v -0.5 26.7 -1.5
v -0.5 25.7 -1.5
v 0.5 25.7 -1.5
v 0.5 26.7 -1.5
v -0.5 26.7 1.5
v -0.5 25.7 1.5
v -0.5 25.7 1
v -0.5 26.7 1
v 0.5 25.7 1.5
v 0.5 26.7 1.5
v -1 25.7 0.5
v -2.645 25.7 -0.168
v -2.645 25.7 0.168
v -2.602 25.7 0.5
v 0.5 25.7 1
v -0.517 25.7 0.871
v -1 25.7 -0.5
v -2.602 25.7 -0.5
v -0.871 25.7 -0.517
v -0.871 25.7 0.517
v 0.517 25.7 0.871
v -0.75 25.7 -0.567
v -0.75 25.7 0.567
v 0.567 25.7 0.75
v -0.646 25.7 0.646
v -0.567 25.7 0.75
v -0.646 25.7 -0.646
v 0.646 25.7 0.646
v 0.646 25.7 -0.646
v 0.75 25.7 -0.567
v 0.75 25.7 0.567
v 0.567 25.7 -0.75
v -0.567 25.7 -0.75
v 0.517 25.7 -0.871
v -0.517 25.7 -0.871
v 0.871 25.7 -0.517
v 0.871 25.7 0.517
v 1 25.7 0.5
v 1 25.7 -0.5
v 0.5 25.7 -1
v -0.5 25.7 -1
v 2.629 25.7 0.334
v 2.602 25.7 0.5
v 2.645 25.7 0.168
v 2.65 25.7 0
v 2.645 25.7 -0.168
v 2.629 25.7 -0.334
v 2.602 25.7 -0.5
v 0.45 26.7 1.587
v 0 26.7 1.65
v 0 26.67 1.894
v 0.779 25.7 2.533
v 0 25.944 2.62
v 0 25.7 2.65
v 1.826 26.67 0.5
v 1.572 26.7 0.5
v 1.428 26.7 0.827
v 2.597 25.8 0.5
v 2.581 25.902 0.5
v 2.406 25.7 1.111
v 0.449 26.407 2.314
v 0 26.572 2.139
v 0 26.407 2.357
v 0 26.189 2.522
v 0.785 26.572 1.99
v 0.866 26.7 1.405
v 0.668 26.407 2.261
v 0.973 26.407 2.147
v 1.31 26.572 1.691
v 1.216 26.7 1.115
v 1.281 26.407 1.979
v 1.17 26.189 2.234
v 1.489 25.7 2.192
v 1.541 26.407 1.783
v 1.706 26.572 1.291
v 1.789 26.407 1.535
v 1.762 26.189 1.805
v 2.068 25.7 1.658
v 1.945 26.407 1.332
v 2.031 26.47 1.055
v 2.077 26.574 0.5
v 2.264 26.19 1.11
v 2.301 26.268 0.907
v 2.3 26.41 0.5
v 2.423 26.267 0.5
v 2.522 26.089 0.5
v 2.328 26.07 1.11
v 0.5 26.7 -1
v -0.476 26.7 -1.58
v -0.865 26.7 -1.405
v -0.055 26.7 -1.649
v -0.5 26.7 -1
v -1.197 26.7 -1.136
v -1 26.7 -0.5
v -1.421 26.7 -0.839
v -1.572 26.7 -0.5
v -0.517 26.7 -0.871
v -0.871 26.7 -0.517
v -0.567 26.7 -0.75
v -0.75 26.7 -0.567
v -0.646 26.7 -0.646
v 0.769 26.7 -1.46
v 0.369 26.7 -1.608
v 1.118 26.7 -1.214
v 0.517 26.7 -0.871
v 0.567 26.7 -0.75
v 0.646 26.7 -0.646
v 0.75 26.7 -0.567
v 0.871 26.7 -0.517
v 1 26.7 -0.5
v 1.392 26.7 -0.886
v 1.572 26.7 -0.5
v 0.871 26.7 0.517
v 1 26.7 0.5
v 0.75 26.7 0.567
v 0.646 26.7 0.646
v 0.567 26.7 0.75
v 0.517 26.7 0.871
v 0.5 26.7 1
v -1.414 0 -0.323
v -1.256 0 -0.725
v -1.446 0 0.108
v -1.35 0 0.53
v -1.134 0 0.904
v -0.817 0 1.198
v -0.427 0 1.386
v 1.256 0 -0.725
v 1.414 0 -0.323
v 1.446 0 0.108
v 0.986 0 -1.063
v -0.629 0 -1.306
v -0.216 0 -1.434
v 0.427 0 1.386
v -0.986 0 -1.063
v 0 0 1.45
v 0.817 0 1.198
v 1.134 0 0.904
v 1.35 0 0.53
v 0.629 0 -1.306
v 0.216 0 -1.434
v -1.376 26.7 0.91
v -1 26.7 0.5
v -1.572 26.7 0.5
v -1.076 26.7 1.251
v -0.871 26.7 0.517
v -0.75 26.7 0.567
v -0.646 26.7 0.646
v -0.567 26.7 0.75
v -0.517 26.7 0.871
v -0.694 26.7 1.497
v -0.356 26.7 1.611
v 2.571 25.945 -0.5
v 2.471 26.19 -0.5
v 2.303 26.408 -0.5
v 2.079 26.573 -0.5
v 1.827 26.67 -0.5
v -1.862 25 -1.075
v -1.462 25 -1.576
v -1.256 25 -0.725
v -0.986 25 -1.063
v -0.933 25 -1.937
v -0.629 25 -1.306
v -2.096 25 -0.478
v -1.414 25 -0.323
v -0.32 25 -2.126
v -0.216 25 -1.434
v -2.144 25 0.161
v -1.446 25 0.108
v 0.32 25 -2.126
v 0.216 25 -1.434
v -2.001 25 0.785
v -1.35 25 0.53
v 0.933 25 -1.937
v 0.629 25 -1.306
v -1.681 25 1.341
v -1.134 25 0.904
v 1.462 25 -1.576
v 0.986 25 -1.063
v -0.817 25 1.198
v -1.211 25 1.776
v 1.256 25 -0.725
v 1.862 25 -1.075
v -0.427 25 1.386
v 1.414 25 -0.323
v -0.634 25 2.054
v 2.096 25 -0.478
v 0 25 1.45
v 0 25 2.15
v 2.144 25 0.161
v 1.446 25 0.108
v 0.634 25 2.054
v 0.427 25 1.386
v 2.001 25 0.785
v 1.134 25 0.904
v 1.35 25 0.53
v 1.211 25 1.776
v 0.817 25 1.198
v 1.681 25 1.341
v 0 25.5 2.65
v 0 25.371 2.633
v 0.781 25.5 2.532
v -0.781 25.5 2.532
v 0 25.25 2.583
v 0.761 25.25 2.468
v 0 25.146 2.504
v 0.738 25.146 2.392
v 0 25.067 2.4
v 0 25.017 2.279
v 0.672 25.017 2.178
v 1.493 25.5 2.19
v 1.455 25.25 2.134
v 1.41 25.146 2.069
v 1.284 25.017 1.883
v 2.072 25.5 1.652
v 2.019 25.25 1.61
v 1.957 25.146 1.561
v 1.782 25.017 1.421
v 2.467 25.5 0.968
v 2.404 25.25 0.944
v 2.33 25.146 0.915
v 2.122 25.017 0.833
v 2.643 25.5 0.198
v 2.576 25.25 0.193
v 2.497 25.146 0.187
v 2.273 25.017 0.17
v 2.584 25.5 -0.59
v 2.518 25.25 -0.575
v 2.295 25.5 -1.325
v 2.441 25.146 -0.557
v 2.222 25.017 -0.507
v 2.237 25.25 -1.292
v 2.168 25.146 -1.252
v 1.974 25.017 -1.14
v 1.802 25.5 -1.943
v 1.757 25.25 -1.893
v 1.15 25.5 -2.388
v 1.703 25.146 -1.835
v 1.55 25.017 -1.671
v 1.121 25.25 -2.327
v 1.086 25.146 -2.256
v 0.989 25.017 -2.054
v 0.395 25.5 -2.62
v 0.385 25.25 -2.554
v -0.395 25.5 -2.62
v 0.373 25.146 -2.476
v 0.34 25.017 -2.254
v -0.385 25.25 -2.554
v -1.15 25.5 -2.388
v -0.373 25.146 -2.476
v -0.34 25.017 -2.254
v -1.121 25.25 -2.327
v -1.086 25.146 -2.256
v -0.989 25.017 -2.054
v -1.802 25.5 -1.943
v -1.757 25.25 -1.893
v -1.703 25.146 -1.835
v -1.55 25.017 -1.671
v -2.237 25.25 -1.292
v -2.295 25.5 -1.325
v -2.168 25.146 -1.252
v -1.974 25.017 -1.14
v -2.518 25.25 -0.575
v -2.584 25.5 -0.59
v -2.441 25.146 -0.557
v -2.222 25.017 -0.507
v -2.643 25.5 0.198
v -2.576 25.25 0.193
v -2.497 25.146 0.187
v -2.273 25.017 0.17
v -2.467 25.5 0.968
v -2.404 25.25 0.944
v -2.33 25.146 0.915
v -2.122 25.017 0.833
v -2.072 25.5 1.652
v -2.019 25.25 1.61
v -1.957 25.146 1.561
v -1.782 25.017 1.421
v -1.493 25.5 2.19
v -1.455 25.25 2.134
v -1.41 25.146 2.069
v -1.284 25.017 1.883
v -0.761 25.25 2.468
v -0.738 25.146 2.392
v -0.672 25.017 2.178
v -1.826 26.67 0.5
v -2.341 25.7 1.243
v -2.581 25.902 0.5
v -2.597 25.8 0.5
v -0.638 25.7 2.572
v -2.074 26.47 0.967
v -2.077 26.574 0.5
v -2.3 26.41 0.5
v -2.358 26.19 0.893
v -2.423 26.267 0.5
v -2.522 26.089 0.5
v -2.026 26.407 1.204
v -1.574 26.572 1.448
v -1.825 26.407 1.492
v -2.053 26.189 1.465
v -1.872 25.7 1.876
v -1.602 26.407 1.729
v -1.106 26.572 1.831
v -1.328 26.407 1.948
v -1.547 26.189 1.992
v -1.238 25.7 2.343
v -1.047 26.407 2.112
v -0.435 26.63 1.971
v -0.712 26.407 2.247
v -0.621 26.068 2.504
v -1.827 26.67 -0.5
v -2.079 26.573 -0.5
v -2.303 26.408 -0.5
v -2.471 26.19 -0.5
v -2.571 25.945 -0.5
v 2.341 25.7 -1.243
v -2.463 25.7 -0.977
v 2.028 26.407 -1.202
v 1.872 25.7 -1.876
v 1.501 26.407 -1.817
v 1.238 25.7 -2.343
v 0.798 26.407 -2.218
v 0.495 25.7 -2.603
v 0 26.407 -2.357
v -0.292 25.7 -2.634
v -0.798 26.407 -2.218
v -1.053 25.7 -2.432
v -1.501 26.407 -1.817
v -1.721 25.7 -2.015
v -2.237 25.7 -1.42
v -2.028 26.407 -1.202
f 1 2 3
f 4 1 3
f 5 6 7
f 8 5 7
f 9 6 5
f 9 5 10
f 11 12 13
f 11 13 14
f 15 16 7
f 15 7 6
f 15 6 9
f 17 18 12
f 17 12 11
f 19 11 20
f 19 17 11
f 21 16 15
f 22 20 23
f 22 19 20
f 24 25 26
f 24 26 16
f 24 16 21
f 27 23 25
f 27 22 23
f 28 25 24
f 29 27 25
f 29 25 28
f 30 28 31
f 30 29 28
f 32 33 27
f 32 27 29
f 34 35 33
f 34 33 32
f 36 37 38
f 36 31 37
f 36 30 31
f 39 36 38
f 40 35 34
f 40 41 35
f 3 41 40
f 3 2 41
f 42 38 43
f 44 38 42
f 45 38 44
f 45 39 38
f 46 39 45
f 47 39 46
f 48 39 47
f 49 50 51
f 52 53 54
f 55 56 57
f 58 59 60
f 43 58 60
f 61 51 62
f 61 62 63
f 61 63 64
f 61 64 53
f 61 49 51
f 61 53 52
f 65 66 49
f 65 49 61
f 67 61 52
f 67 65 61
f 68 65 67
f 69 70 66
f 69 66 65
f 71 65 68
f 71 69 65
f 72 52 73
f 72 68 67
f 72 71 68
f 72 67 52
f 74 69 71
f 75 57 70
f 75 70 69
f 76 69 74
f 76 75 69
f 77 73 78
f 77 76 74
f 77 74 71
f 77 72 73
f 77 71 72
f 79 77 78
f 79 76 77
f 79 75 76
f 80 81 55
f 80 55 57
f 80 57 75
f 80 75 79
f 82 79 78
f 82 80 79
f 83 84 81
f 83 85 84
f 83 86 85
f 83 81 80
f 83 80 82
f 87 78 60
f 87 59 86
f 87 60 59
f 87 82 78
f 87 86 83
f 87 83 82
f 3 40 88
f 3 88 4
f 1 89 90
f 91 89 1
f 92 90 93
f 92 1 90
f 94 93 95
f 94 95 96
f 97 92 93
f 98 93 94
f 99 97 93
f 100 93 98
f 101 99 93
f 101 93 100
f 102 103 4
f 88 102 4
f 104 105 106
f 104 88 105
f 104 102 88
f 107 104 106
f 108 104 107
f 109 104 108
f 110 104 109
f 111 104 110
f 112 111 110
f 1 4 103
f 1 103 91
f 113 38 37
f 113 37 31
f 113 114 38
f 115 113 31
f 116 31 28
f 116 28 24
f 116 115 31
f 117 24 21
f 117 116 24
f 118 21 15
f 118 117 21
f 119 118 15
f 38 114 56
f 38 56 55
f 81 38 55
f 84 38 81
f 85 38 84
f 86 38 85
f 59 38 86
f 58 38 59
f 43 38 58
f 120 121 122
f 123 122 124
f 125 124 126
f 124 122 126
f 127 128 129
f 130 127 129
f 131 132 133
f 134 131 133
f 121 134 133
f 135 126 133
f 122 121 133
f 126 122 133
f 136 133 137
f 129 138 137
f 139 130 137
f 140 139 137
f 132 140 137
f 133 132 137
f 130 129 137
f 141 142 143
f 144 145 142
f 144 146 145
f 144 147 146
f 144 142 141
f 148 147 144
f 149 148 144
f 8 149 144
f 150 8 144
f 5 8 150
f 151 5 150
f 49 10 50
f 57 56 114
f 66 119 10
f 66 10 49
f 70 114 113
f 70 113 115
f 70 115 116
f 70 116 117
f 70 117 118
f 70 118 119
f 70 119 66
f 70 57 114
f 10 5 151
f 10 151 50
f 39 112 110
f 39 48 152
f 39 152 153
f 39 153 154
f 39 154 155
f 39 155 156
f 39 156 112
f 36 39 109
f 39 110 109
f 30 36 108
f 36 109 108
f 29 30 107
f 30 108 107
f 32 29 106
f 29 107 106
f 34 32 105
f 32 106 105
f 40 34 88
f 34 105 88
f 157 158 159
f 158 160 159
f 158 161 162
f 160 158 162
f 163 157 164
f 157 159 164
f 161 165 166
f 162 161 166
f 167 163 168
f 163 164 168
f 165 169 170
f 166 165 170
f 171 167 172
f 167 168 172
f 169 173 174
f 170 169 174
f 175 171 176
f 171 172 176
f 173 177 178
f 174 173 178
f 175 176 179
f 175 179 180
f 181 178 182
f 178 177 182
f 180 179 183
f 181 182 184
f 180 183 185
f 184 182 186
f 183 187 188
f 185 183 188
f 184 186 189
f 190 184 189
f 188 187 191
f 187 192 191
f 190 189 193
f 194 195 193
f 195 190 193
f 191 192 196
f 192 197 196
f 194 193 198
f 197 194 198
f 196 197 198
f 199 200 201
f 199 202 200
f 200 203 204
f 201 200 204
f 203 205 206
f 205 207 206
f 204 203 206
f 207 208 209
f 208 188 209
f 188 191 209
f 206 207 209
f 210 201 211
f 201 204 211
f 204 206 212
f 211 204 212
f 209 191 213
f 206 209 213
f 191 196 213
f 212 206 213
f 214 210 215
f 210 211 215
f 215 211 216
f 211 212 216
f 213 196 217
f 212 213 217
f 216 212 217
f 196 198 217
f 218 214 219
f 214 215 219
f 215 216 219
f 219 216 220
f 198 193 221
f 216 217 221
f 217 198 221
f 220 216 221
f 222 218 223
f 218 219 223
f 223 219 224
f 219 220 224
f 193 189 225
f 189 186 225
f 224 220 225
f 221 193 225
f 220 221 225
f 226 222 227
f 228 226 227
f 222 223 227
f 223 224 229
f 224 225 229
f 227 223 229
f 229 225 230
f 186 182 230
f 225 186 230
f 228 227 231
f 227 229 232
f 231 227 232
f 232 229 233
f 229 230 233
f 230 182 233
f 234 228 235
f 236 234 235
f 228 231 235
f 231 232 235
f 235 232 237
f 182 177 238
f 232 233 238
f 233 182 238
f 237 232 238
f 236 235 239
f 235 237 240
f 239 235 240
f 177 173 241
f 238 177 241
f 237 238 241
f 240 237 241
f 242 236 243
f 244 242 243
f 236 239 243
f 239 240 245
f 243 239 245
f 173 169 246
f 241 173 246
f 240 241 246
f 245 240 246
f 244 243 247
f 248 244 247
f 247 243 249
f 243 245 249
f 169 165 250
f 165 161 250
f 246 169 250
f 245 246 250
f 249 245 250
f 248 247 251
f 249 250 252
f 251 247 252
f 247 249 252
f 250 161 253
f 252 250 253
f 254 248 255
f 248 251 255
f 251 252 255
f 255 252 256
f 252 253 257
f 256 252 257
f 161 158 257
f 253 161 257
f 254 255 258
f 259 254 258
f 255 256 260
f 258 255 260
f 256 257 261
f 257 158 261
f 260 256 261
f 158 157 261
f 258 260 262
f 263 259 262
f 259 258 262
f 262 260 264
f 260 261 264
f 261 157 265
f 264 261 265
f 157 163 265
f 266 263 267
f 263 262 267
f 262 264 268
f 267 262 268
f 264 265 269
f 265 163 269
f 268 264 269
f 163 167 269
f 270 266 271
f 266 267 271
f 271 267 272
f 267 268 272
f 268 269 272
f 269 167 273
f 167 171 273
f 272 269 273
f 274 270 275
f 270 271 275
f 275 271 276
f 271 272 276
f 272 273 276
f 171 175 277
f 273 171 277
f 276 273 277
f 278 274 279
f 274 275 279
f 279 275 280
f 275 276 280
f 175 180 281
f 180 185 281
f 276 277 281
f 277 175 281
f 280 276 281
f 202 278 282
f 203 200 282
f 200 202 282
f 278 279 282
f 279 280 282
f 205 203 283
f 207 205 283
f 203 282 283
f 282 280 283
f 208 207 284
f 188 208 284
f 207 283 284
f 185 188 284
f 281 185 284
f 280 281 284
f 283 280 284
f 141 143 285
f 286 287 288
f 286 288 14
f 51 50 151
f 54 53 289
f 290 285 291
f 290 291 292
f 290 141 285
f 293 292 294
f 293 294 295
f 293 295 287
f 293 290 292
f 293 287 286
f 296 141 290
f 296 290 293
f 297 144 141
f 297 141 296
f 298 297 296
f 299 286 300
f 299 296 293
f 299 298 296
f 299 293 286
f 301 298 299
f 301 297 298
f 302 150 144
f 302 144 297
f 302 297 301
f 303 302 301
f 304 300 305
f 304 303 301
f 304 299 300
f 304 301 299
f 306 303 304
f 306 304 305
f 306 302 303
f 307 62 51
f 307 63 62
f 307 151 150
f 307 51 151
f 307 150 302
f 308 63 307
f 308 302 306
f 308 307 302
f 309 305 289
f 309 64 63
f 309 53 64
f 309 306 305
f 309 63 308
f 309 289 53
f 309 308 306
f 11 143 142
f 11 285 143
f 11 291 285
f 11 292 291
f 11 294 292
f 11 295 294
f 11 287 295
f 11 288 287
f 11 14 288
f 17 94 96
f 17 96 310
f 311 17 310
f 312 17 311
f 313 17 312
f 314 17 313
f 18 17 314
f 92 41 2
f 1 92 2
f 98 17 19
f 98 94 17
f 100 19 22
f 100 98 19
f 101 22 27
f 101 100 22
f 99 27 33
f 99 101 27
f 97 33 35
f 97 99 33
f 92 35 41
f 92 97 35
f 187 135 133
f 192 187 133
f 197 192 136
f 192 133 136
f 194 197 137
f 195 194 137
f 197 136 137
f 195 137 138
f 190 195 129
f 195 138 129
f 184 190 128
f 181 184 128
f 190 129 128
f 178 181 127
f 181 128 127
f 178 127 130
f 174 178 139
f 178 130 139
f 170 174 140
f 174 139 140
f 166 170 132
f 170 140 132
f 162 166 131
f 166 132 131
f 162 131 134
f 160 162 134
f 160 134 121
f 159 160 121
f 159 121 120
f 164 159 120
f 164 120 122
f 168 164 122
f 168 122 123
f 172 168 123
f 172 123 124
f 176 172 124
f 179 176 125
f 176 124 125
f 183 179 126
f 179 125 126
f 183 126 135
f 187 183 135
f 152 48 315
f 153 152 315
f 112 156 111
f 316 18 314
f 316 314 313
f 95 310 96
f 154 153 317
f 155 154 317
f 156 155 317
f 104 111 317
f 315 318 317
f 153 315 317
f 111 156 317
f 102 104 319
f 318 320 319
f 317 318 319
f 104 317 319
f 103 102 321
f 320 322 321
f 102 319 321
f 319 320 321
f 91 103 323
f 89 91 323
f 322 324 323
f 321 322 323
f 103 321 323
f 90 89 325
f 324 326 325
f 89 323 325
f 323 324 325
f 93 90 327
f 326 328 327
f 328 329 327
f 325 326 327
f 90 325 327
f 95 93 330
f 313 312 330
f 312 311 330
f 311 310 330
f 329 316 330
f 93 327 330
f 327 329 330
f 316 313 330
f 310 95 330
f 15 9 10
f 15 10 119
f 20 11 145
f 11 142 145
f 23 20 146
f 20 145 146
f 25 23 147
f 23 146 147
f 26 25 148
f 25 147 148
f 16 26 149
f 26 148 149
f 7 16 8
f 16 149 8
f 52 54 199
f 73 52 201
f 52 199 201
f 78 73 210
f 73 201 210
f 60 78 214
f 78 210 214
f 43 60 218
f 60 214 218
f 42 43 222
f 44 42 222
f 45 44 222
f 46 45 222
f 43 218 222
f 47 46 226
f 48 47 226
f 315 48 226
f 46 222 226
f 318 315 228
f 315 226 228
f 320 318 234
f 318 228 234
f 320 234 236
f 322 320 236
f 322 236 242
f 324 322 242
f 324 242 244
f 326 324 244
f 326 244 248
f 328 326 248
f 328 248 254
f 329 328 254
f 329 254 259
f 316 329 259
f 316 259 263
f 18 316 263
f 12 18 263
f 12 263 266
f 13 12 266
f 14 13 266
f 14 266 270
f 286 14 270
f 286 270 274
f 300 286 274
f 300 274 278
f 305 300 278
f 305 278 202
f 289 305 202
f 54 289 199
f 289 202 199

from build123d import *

# Parameters (mm, degrees)
SKETCH_1_R          = 1.45
EXTRUDE_1_DEPTH     = 25
SKETCH_2_R          = 2.65
EXTRUDE_2_DEPTH     = 1.7
CUT_EXTRUDE_START   = -1
SKETCH_3_W          = 1
SKETCH_3_H          = 1
CUT_EXTRUDE_1_DEPTH = 1
FILLET_1_R          = 0.5
FILLET_2_R          = 1
FILLET_3_R          = 0.5


with BuildPart() as part:
    # 草图1 → 凸台-拉伸1 (new body)
    with BuildSketch(Plane(origin=(0, 0, 0), x_dir=(1, 0, 0), z_dir=(0, 1, 0))):
        with Locations(Location((0, 0, 0), (0, 0, 270))):
            Circle(SKETCH_1_R)
    extrude(amount=EXTRUDE_1_DEPTH)

    # 草图2 → 凸台-拉伸2 (add)
    with BuildSketch(Plane(origin=(0, 25, 0), x_dir=(1, 0, 0), z_dir=(0, 1, 0))):
        with Locations(Location((0, 0, 0), (0, 0, 270))):
            Circle(SKETCH_2_R)
    extrude(amount=EXTRUDE_2_DEPTH)

    # 草图3 → 切除-拉伸1 (cut)
    with BuildSketch(Plane(origin=(0, 26.7, 0), x_dir=(1, 0, 0), z_dir=(0, 1, 0)).offset(CUT_EXTRUDE_START)):
        with BuildLine():
            Line((-0.5, 0.5), (-2.602402736, 0.5))
            ThreePointArc((-2.602402736, 0.5), (-2.65, 0), (-2.602402736, -0.5))
            Line((-2.602402736, -0.5), (-0.5, -0.5))
            Line((-0.5, -0.5), (-0.5, 0.5))
        make_face()
        with Locations((0, 1)):
            Rectangle(SKETCH_3_W, SKETCH_3_H)
        Rectangle(SKETCH_3_W, SKETCH_3_H)
        with Locations((0, -1)):
            Rectangle(SKETCH_3_W, SKETCH_3_H)
        with BuildLine():
            ThreePointArc((2.65, 0), (2.638073848, 0.251130195), (2.602402736, 0.5))
            Line((2.602402736, 0.5), (0.5, 0.5))
            Line((0.5, 0.5), (0.5, -0.5))
            Line((0.5, -0.5), (2.602402736, -0.5))
            ThreePointArc((2.602402736, -0.5), (2.638073848, -0.251130195), (2.65, 0))
        make_face()
    extrude(amount=CUT_EXTRUDE_1_DEPTH, mode=Mode.SUBTRACT)

    # 圆角1
    fillet_1_edges = [part.edges().sort_by_distance(p)[0] for p in [
        (-0.5, 26.2, 0.5),
        (-0.5, 26.2, -0.5),
        (0.5, 26.2, -0.5),
        (0.5, 26.2, 0.5),
    ]]
    fillet(fillet_1_edges, radius=FILLET_1_R)

    # 圆角2
    fillet_2_edges = [part.edges().sort_by_distance(p)[0] for p in [
        (0, 26.7, -2.65),
        (1.687824043, 26.7, 2.042975771),
    ]]
    fillet(fillet_2_edges, radius=FILLET_2_R)

    # 圆角3
    fillet_3_edges = [part.edges().sort_by_distance(p)[0] for p in [
        (0, 25, -2.65),
    ]]
    fillet(fillet_3_edges, radius=FILLET_3_R)


solid = part.part
